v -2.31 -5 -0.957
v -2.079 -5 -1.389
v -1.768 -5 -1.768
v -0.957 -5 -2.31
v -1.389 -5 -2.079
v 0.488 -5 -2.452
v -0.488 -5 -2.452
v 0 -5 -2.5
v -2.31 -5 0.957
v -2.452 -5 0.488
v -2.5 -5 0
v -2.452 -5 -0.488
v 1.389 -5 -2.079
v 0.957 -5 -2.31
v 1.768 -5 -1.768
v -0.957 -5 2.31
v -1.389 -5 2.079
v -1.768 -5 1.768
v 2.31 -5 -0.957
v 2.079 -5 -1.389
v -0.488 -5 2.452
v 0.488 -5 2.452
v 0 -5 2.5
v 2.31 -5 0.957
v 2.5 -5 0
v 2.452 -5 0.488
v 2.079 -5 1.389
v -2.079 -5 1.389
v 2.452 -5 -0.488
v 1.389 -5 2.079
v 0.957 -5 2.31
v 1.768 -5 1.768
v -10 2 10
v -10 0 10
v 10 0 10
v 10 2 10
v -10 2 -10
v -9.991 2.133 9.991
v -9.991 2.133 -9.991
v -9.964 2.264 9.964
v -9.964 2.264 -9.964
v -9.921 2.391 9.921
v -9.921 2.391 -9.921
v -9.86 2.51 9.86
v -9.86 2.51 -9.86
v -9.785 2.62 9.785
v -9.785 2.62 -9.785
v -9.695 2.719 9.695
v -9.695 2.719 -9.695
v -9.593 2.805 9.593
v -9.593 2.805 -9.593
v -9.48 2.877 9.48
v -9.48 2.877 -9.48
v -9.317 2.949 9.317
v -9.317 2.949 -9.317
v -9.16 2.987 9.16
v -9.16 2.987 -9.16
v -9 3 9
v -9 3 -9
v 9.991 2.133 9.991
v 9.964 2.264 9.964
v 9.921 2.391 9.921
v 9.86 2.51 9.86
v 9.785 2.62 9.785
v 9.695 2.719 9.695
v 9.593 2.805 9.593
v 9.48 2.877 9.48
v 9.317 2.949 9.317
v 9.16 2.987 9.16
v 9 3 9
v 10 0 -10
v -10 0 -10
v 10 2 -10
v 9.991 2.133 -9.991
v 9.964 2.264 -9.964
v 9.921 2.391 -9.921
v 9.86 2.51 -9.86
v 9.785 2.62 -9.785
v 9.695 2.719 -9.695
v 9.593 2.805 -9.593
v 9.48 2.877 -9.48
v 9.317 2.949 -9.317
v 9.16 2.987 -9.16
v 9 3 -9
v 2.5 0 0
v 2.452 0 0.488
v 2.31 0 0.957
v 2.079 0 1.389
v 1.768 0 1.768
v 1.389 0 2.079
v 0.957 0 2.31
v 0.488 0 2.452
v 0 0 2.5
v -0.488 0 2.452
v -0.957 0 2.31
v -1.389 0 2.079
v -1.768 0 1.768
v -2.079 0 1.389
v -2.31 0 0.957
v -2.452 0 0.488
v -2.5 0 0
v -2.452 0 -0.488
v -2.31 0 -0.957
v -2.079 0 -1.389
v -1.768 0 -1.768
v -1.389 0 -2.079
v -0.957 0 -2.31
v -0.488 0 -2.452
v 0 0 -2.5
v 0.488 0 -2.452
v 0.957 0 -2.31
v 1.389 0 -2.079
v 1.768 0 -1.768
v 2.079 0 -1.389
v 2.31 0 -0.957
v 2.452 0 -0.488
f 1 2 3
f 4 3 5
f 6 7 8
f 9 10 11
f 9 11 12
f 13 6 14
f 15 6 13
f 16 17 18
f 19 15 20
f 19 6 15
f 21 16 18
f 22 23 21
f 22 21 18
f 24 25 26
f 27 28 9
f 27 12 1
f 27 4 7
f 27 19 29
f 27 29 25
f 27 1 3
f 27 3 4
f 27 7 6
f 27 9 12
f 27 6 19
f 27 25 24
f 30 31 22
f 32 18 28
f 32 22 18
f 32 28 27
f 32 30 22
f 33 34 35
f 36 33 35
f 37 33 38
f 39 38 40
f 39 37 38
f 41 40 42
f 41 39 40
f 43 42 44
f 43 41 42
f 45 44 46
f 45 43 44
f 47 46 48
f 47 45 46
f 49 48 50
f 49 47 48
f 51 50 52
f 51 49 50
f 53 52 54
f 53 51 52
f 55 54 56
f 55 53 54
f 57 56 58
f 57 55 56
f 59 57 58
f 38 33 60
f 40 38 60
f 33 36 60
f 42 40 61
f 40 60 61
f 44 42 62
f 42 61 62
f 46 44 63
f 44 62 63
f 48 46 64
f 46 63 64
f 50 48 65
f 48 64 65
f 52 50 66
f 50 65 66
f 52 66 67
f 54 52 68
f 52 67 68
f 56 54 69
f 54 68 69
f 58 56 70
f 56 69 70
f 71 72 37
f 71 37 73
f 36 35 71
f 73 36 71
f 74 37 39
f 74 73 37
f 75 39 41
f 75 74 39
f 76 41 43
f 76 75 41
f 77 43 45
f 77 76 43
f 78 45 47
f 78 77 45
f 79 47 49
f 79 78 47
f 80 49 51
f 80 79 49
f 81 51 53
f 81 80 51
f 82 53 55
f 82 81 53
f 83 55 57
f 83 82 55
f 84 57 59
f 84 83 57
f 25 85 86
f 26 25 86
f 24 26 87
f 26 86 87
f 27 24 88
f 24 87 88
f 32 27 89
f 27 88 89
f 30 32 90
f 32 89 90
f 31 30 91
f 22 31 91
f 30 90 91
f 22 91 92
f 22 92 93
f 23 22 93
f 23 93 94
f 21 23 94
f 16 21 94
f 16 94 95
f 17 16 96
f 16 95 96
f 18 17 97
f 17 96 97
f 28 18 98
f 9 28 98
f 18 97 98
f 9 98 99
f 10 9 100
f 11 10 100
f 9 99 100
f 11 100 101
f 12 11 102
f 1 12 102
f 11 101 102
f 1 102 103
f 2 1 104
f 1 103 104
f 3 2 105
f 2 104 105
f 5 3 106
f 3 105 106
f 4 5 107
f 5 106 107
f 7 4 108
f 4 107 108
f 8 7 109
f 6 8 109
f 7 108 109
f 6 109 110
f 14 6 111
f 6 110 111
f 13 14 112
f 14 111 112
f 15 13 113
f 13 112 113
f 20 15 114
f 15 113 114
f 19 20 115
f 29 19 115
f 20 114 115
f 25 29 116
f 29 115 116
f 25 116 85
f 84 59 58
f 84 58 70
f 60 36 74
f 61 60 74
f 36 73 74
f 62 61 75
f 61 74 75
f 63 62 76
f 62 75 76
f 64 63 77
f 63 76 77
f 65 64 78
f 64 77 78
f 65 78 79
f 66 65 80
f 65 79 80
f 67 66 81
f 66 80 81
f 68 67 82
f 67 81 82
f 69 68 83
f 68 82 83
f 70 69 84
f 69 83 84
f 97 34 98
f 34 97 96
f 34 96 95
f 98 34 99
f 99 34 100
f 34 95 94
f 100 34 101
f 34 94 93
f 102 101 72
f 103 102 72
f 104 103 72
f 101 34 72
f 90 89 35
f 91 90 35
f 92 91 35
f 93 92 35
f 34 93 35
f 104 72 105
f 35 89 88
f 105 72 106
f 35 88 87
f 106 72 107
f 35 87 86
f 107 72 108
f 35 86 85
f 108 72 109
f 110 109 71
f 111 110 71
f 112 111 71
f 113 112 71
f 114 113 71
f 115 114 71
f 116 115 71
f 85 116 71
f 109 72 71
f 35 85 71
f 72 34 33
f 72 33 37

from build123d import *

# Parameters (mm, degrees)
SKETCH1_W           = 20
SKETCH1_H           = 20
BOSS_EXTRUDE1_DEPTH = 3
FILLET1_R           = 1
SKETCH2_R           = 2.5
BOSS_EXTRUDE2_DEPTH = 5


with BuildPart() as part:
    # Sketch1 → Boss-Extrude1 (new body)
    with BuildSketch(Plane(origin=(0, 0, 0), x_dir=(1, 0, 0), z_dir=(0, 1, 0))):
        Rectangle(SKETCH1_W, SKETCH1_H)
    extrude(amount=BOSS_EXTRUDE1_DEPTH)

    # Fillet1
    fillet1_edges = [part.edges().sort_by_distance(p)[0] for p in [
        (-10, 3, 0),
        (0, 3, 10),
        (10, 3, 0),
        (0, 3, -10),
    ]]
    fillet(fillet1_edges, radius=FILLET1_R)

    # Sketch2 → Boss-Extrude2 (add)
    with BuildSketch(Plane.XZ):
        Circle(SKETCH2_R)
    extrude(amount=BOSS_EXTRUDE2_DEPTH)


solid = part.part
